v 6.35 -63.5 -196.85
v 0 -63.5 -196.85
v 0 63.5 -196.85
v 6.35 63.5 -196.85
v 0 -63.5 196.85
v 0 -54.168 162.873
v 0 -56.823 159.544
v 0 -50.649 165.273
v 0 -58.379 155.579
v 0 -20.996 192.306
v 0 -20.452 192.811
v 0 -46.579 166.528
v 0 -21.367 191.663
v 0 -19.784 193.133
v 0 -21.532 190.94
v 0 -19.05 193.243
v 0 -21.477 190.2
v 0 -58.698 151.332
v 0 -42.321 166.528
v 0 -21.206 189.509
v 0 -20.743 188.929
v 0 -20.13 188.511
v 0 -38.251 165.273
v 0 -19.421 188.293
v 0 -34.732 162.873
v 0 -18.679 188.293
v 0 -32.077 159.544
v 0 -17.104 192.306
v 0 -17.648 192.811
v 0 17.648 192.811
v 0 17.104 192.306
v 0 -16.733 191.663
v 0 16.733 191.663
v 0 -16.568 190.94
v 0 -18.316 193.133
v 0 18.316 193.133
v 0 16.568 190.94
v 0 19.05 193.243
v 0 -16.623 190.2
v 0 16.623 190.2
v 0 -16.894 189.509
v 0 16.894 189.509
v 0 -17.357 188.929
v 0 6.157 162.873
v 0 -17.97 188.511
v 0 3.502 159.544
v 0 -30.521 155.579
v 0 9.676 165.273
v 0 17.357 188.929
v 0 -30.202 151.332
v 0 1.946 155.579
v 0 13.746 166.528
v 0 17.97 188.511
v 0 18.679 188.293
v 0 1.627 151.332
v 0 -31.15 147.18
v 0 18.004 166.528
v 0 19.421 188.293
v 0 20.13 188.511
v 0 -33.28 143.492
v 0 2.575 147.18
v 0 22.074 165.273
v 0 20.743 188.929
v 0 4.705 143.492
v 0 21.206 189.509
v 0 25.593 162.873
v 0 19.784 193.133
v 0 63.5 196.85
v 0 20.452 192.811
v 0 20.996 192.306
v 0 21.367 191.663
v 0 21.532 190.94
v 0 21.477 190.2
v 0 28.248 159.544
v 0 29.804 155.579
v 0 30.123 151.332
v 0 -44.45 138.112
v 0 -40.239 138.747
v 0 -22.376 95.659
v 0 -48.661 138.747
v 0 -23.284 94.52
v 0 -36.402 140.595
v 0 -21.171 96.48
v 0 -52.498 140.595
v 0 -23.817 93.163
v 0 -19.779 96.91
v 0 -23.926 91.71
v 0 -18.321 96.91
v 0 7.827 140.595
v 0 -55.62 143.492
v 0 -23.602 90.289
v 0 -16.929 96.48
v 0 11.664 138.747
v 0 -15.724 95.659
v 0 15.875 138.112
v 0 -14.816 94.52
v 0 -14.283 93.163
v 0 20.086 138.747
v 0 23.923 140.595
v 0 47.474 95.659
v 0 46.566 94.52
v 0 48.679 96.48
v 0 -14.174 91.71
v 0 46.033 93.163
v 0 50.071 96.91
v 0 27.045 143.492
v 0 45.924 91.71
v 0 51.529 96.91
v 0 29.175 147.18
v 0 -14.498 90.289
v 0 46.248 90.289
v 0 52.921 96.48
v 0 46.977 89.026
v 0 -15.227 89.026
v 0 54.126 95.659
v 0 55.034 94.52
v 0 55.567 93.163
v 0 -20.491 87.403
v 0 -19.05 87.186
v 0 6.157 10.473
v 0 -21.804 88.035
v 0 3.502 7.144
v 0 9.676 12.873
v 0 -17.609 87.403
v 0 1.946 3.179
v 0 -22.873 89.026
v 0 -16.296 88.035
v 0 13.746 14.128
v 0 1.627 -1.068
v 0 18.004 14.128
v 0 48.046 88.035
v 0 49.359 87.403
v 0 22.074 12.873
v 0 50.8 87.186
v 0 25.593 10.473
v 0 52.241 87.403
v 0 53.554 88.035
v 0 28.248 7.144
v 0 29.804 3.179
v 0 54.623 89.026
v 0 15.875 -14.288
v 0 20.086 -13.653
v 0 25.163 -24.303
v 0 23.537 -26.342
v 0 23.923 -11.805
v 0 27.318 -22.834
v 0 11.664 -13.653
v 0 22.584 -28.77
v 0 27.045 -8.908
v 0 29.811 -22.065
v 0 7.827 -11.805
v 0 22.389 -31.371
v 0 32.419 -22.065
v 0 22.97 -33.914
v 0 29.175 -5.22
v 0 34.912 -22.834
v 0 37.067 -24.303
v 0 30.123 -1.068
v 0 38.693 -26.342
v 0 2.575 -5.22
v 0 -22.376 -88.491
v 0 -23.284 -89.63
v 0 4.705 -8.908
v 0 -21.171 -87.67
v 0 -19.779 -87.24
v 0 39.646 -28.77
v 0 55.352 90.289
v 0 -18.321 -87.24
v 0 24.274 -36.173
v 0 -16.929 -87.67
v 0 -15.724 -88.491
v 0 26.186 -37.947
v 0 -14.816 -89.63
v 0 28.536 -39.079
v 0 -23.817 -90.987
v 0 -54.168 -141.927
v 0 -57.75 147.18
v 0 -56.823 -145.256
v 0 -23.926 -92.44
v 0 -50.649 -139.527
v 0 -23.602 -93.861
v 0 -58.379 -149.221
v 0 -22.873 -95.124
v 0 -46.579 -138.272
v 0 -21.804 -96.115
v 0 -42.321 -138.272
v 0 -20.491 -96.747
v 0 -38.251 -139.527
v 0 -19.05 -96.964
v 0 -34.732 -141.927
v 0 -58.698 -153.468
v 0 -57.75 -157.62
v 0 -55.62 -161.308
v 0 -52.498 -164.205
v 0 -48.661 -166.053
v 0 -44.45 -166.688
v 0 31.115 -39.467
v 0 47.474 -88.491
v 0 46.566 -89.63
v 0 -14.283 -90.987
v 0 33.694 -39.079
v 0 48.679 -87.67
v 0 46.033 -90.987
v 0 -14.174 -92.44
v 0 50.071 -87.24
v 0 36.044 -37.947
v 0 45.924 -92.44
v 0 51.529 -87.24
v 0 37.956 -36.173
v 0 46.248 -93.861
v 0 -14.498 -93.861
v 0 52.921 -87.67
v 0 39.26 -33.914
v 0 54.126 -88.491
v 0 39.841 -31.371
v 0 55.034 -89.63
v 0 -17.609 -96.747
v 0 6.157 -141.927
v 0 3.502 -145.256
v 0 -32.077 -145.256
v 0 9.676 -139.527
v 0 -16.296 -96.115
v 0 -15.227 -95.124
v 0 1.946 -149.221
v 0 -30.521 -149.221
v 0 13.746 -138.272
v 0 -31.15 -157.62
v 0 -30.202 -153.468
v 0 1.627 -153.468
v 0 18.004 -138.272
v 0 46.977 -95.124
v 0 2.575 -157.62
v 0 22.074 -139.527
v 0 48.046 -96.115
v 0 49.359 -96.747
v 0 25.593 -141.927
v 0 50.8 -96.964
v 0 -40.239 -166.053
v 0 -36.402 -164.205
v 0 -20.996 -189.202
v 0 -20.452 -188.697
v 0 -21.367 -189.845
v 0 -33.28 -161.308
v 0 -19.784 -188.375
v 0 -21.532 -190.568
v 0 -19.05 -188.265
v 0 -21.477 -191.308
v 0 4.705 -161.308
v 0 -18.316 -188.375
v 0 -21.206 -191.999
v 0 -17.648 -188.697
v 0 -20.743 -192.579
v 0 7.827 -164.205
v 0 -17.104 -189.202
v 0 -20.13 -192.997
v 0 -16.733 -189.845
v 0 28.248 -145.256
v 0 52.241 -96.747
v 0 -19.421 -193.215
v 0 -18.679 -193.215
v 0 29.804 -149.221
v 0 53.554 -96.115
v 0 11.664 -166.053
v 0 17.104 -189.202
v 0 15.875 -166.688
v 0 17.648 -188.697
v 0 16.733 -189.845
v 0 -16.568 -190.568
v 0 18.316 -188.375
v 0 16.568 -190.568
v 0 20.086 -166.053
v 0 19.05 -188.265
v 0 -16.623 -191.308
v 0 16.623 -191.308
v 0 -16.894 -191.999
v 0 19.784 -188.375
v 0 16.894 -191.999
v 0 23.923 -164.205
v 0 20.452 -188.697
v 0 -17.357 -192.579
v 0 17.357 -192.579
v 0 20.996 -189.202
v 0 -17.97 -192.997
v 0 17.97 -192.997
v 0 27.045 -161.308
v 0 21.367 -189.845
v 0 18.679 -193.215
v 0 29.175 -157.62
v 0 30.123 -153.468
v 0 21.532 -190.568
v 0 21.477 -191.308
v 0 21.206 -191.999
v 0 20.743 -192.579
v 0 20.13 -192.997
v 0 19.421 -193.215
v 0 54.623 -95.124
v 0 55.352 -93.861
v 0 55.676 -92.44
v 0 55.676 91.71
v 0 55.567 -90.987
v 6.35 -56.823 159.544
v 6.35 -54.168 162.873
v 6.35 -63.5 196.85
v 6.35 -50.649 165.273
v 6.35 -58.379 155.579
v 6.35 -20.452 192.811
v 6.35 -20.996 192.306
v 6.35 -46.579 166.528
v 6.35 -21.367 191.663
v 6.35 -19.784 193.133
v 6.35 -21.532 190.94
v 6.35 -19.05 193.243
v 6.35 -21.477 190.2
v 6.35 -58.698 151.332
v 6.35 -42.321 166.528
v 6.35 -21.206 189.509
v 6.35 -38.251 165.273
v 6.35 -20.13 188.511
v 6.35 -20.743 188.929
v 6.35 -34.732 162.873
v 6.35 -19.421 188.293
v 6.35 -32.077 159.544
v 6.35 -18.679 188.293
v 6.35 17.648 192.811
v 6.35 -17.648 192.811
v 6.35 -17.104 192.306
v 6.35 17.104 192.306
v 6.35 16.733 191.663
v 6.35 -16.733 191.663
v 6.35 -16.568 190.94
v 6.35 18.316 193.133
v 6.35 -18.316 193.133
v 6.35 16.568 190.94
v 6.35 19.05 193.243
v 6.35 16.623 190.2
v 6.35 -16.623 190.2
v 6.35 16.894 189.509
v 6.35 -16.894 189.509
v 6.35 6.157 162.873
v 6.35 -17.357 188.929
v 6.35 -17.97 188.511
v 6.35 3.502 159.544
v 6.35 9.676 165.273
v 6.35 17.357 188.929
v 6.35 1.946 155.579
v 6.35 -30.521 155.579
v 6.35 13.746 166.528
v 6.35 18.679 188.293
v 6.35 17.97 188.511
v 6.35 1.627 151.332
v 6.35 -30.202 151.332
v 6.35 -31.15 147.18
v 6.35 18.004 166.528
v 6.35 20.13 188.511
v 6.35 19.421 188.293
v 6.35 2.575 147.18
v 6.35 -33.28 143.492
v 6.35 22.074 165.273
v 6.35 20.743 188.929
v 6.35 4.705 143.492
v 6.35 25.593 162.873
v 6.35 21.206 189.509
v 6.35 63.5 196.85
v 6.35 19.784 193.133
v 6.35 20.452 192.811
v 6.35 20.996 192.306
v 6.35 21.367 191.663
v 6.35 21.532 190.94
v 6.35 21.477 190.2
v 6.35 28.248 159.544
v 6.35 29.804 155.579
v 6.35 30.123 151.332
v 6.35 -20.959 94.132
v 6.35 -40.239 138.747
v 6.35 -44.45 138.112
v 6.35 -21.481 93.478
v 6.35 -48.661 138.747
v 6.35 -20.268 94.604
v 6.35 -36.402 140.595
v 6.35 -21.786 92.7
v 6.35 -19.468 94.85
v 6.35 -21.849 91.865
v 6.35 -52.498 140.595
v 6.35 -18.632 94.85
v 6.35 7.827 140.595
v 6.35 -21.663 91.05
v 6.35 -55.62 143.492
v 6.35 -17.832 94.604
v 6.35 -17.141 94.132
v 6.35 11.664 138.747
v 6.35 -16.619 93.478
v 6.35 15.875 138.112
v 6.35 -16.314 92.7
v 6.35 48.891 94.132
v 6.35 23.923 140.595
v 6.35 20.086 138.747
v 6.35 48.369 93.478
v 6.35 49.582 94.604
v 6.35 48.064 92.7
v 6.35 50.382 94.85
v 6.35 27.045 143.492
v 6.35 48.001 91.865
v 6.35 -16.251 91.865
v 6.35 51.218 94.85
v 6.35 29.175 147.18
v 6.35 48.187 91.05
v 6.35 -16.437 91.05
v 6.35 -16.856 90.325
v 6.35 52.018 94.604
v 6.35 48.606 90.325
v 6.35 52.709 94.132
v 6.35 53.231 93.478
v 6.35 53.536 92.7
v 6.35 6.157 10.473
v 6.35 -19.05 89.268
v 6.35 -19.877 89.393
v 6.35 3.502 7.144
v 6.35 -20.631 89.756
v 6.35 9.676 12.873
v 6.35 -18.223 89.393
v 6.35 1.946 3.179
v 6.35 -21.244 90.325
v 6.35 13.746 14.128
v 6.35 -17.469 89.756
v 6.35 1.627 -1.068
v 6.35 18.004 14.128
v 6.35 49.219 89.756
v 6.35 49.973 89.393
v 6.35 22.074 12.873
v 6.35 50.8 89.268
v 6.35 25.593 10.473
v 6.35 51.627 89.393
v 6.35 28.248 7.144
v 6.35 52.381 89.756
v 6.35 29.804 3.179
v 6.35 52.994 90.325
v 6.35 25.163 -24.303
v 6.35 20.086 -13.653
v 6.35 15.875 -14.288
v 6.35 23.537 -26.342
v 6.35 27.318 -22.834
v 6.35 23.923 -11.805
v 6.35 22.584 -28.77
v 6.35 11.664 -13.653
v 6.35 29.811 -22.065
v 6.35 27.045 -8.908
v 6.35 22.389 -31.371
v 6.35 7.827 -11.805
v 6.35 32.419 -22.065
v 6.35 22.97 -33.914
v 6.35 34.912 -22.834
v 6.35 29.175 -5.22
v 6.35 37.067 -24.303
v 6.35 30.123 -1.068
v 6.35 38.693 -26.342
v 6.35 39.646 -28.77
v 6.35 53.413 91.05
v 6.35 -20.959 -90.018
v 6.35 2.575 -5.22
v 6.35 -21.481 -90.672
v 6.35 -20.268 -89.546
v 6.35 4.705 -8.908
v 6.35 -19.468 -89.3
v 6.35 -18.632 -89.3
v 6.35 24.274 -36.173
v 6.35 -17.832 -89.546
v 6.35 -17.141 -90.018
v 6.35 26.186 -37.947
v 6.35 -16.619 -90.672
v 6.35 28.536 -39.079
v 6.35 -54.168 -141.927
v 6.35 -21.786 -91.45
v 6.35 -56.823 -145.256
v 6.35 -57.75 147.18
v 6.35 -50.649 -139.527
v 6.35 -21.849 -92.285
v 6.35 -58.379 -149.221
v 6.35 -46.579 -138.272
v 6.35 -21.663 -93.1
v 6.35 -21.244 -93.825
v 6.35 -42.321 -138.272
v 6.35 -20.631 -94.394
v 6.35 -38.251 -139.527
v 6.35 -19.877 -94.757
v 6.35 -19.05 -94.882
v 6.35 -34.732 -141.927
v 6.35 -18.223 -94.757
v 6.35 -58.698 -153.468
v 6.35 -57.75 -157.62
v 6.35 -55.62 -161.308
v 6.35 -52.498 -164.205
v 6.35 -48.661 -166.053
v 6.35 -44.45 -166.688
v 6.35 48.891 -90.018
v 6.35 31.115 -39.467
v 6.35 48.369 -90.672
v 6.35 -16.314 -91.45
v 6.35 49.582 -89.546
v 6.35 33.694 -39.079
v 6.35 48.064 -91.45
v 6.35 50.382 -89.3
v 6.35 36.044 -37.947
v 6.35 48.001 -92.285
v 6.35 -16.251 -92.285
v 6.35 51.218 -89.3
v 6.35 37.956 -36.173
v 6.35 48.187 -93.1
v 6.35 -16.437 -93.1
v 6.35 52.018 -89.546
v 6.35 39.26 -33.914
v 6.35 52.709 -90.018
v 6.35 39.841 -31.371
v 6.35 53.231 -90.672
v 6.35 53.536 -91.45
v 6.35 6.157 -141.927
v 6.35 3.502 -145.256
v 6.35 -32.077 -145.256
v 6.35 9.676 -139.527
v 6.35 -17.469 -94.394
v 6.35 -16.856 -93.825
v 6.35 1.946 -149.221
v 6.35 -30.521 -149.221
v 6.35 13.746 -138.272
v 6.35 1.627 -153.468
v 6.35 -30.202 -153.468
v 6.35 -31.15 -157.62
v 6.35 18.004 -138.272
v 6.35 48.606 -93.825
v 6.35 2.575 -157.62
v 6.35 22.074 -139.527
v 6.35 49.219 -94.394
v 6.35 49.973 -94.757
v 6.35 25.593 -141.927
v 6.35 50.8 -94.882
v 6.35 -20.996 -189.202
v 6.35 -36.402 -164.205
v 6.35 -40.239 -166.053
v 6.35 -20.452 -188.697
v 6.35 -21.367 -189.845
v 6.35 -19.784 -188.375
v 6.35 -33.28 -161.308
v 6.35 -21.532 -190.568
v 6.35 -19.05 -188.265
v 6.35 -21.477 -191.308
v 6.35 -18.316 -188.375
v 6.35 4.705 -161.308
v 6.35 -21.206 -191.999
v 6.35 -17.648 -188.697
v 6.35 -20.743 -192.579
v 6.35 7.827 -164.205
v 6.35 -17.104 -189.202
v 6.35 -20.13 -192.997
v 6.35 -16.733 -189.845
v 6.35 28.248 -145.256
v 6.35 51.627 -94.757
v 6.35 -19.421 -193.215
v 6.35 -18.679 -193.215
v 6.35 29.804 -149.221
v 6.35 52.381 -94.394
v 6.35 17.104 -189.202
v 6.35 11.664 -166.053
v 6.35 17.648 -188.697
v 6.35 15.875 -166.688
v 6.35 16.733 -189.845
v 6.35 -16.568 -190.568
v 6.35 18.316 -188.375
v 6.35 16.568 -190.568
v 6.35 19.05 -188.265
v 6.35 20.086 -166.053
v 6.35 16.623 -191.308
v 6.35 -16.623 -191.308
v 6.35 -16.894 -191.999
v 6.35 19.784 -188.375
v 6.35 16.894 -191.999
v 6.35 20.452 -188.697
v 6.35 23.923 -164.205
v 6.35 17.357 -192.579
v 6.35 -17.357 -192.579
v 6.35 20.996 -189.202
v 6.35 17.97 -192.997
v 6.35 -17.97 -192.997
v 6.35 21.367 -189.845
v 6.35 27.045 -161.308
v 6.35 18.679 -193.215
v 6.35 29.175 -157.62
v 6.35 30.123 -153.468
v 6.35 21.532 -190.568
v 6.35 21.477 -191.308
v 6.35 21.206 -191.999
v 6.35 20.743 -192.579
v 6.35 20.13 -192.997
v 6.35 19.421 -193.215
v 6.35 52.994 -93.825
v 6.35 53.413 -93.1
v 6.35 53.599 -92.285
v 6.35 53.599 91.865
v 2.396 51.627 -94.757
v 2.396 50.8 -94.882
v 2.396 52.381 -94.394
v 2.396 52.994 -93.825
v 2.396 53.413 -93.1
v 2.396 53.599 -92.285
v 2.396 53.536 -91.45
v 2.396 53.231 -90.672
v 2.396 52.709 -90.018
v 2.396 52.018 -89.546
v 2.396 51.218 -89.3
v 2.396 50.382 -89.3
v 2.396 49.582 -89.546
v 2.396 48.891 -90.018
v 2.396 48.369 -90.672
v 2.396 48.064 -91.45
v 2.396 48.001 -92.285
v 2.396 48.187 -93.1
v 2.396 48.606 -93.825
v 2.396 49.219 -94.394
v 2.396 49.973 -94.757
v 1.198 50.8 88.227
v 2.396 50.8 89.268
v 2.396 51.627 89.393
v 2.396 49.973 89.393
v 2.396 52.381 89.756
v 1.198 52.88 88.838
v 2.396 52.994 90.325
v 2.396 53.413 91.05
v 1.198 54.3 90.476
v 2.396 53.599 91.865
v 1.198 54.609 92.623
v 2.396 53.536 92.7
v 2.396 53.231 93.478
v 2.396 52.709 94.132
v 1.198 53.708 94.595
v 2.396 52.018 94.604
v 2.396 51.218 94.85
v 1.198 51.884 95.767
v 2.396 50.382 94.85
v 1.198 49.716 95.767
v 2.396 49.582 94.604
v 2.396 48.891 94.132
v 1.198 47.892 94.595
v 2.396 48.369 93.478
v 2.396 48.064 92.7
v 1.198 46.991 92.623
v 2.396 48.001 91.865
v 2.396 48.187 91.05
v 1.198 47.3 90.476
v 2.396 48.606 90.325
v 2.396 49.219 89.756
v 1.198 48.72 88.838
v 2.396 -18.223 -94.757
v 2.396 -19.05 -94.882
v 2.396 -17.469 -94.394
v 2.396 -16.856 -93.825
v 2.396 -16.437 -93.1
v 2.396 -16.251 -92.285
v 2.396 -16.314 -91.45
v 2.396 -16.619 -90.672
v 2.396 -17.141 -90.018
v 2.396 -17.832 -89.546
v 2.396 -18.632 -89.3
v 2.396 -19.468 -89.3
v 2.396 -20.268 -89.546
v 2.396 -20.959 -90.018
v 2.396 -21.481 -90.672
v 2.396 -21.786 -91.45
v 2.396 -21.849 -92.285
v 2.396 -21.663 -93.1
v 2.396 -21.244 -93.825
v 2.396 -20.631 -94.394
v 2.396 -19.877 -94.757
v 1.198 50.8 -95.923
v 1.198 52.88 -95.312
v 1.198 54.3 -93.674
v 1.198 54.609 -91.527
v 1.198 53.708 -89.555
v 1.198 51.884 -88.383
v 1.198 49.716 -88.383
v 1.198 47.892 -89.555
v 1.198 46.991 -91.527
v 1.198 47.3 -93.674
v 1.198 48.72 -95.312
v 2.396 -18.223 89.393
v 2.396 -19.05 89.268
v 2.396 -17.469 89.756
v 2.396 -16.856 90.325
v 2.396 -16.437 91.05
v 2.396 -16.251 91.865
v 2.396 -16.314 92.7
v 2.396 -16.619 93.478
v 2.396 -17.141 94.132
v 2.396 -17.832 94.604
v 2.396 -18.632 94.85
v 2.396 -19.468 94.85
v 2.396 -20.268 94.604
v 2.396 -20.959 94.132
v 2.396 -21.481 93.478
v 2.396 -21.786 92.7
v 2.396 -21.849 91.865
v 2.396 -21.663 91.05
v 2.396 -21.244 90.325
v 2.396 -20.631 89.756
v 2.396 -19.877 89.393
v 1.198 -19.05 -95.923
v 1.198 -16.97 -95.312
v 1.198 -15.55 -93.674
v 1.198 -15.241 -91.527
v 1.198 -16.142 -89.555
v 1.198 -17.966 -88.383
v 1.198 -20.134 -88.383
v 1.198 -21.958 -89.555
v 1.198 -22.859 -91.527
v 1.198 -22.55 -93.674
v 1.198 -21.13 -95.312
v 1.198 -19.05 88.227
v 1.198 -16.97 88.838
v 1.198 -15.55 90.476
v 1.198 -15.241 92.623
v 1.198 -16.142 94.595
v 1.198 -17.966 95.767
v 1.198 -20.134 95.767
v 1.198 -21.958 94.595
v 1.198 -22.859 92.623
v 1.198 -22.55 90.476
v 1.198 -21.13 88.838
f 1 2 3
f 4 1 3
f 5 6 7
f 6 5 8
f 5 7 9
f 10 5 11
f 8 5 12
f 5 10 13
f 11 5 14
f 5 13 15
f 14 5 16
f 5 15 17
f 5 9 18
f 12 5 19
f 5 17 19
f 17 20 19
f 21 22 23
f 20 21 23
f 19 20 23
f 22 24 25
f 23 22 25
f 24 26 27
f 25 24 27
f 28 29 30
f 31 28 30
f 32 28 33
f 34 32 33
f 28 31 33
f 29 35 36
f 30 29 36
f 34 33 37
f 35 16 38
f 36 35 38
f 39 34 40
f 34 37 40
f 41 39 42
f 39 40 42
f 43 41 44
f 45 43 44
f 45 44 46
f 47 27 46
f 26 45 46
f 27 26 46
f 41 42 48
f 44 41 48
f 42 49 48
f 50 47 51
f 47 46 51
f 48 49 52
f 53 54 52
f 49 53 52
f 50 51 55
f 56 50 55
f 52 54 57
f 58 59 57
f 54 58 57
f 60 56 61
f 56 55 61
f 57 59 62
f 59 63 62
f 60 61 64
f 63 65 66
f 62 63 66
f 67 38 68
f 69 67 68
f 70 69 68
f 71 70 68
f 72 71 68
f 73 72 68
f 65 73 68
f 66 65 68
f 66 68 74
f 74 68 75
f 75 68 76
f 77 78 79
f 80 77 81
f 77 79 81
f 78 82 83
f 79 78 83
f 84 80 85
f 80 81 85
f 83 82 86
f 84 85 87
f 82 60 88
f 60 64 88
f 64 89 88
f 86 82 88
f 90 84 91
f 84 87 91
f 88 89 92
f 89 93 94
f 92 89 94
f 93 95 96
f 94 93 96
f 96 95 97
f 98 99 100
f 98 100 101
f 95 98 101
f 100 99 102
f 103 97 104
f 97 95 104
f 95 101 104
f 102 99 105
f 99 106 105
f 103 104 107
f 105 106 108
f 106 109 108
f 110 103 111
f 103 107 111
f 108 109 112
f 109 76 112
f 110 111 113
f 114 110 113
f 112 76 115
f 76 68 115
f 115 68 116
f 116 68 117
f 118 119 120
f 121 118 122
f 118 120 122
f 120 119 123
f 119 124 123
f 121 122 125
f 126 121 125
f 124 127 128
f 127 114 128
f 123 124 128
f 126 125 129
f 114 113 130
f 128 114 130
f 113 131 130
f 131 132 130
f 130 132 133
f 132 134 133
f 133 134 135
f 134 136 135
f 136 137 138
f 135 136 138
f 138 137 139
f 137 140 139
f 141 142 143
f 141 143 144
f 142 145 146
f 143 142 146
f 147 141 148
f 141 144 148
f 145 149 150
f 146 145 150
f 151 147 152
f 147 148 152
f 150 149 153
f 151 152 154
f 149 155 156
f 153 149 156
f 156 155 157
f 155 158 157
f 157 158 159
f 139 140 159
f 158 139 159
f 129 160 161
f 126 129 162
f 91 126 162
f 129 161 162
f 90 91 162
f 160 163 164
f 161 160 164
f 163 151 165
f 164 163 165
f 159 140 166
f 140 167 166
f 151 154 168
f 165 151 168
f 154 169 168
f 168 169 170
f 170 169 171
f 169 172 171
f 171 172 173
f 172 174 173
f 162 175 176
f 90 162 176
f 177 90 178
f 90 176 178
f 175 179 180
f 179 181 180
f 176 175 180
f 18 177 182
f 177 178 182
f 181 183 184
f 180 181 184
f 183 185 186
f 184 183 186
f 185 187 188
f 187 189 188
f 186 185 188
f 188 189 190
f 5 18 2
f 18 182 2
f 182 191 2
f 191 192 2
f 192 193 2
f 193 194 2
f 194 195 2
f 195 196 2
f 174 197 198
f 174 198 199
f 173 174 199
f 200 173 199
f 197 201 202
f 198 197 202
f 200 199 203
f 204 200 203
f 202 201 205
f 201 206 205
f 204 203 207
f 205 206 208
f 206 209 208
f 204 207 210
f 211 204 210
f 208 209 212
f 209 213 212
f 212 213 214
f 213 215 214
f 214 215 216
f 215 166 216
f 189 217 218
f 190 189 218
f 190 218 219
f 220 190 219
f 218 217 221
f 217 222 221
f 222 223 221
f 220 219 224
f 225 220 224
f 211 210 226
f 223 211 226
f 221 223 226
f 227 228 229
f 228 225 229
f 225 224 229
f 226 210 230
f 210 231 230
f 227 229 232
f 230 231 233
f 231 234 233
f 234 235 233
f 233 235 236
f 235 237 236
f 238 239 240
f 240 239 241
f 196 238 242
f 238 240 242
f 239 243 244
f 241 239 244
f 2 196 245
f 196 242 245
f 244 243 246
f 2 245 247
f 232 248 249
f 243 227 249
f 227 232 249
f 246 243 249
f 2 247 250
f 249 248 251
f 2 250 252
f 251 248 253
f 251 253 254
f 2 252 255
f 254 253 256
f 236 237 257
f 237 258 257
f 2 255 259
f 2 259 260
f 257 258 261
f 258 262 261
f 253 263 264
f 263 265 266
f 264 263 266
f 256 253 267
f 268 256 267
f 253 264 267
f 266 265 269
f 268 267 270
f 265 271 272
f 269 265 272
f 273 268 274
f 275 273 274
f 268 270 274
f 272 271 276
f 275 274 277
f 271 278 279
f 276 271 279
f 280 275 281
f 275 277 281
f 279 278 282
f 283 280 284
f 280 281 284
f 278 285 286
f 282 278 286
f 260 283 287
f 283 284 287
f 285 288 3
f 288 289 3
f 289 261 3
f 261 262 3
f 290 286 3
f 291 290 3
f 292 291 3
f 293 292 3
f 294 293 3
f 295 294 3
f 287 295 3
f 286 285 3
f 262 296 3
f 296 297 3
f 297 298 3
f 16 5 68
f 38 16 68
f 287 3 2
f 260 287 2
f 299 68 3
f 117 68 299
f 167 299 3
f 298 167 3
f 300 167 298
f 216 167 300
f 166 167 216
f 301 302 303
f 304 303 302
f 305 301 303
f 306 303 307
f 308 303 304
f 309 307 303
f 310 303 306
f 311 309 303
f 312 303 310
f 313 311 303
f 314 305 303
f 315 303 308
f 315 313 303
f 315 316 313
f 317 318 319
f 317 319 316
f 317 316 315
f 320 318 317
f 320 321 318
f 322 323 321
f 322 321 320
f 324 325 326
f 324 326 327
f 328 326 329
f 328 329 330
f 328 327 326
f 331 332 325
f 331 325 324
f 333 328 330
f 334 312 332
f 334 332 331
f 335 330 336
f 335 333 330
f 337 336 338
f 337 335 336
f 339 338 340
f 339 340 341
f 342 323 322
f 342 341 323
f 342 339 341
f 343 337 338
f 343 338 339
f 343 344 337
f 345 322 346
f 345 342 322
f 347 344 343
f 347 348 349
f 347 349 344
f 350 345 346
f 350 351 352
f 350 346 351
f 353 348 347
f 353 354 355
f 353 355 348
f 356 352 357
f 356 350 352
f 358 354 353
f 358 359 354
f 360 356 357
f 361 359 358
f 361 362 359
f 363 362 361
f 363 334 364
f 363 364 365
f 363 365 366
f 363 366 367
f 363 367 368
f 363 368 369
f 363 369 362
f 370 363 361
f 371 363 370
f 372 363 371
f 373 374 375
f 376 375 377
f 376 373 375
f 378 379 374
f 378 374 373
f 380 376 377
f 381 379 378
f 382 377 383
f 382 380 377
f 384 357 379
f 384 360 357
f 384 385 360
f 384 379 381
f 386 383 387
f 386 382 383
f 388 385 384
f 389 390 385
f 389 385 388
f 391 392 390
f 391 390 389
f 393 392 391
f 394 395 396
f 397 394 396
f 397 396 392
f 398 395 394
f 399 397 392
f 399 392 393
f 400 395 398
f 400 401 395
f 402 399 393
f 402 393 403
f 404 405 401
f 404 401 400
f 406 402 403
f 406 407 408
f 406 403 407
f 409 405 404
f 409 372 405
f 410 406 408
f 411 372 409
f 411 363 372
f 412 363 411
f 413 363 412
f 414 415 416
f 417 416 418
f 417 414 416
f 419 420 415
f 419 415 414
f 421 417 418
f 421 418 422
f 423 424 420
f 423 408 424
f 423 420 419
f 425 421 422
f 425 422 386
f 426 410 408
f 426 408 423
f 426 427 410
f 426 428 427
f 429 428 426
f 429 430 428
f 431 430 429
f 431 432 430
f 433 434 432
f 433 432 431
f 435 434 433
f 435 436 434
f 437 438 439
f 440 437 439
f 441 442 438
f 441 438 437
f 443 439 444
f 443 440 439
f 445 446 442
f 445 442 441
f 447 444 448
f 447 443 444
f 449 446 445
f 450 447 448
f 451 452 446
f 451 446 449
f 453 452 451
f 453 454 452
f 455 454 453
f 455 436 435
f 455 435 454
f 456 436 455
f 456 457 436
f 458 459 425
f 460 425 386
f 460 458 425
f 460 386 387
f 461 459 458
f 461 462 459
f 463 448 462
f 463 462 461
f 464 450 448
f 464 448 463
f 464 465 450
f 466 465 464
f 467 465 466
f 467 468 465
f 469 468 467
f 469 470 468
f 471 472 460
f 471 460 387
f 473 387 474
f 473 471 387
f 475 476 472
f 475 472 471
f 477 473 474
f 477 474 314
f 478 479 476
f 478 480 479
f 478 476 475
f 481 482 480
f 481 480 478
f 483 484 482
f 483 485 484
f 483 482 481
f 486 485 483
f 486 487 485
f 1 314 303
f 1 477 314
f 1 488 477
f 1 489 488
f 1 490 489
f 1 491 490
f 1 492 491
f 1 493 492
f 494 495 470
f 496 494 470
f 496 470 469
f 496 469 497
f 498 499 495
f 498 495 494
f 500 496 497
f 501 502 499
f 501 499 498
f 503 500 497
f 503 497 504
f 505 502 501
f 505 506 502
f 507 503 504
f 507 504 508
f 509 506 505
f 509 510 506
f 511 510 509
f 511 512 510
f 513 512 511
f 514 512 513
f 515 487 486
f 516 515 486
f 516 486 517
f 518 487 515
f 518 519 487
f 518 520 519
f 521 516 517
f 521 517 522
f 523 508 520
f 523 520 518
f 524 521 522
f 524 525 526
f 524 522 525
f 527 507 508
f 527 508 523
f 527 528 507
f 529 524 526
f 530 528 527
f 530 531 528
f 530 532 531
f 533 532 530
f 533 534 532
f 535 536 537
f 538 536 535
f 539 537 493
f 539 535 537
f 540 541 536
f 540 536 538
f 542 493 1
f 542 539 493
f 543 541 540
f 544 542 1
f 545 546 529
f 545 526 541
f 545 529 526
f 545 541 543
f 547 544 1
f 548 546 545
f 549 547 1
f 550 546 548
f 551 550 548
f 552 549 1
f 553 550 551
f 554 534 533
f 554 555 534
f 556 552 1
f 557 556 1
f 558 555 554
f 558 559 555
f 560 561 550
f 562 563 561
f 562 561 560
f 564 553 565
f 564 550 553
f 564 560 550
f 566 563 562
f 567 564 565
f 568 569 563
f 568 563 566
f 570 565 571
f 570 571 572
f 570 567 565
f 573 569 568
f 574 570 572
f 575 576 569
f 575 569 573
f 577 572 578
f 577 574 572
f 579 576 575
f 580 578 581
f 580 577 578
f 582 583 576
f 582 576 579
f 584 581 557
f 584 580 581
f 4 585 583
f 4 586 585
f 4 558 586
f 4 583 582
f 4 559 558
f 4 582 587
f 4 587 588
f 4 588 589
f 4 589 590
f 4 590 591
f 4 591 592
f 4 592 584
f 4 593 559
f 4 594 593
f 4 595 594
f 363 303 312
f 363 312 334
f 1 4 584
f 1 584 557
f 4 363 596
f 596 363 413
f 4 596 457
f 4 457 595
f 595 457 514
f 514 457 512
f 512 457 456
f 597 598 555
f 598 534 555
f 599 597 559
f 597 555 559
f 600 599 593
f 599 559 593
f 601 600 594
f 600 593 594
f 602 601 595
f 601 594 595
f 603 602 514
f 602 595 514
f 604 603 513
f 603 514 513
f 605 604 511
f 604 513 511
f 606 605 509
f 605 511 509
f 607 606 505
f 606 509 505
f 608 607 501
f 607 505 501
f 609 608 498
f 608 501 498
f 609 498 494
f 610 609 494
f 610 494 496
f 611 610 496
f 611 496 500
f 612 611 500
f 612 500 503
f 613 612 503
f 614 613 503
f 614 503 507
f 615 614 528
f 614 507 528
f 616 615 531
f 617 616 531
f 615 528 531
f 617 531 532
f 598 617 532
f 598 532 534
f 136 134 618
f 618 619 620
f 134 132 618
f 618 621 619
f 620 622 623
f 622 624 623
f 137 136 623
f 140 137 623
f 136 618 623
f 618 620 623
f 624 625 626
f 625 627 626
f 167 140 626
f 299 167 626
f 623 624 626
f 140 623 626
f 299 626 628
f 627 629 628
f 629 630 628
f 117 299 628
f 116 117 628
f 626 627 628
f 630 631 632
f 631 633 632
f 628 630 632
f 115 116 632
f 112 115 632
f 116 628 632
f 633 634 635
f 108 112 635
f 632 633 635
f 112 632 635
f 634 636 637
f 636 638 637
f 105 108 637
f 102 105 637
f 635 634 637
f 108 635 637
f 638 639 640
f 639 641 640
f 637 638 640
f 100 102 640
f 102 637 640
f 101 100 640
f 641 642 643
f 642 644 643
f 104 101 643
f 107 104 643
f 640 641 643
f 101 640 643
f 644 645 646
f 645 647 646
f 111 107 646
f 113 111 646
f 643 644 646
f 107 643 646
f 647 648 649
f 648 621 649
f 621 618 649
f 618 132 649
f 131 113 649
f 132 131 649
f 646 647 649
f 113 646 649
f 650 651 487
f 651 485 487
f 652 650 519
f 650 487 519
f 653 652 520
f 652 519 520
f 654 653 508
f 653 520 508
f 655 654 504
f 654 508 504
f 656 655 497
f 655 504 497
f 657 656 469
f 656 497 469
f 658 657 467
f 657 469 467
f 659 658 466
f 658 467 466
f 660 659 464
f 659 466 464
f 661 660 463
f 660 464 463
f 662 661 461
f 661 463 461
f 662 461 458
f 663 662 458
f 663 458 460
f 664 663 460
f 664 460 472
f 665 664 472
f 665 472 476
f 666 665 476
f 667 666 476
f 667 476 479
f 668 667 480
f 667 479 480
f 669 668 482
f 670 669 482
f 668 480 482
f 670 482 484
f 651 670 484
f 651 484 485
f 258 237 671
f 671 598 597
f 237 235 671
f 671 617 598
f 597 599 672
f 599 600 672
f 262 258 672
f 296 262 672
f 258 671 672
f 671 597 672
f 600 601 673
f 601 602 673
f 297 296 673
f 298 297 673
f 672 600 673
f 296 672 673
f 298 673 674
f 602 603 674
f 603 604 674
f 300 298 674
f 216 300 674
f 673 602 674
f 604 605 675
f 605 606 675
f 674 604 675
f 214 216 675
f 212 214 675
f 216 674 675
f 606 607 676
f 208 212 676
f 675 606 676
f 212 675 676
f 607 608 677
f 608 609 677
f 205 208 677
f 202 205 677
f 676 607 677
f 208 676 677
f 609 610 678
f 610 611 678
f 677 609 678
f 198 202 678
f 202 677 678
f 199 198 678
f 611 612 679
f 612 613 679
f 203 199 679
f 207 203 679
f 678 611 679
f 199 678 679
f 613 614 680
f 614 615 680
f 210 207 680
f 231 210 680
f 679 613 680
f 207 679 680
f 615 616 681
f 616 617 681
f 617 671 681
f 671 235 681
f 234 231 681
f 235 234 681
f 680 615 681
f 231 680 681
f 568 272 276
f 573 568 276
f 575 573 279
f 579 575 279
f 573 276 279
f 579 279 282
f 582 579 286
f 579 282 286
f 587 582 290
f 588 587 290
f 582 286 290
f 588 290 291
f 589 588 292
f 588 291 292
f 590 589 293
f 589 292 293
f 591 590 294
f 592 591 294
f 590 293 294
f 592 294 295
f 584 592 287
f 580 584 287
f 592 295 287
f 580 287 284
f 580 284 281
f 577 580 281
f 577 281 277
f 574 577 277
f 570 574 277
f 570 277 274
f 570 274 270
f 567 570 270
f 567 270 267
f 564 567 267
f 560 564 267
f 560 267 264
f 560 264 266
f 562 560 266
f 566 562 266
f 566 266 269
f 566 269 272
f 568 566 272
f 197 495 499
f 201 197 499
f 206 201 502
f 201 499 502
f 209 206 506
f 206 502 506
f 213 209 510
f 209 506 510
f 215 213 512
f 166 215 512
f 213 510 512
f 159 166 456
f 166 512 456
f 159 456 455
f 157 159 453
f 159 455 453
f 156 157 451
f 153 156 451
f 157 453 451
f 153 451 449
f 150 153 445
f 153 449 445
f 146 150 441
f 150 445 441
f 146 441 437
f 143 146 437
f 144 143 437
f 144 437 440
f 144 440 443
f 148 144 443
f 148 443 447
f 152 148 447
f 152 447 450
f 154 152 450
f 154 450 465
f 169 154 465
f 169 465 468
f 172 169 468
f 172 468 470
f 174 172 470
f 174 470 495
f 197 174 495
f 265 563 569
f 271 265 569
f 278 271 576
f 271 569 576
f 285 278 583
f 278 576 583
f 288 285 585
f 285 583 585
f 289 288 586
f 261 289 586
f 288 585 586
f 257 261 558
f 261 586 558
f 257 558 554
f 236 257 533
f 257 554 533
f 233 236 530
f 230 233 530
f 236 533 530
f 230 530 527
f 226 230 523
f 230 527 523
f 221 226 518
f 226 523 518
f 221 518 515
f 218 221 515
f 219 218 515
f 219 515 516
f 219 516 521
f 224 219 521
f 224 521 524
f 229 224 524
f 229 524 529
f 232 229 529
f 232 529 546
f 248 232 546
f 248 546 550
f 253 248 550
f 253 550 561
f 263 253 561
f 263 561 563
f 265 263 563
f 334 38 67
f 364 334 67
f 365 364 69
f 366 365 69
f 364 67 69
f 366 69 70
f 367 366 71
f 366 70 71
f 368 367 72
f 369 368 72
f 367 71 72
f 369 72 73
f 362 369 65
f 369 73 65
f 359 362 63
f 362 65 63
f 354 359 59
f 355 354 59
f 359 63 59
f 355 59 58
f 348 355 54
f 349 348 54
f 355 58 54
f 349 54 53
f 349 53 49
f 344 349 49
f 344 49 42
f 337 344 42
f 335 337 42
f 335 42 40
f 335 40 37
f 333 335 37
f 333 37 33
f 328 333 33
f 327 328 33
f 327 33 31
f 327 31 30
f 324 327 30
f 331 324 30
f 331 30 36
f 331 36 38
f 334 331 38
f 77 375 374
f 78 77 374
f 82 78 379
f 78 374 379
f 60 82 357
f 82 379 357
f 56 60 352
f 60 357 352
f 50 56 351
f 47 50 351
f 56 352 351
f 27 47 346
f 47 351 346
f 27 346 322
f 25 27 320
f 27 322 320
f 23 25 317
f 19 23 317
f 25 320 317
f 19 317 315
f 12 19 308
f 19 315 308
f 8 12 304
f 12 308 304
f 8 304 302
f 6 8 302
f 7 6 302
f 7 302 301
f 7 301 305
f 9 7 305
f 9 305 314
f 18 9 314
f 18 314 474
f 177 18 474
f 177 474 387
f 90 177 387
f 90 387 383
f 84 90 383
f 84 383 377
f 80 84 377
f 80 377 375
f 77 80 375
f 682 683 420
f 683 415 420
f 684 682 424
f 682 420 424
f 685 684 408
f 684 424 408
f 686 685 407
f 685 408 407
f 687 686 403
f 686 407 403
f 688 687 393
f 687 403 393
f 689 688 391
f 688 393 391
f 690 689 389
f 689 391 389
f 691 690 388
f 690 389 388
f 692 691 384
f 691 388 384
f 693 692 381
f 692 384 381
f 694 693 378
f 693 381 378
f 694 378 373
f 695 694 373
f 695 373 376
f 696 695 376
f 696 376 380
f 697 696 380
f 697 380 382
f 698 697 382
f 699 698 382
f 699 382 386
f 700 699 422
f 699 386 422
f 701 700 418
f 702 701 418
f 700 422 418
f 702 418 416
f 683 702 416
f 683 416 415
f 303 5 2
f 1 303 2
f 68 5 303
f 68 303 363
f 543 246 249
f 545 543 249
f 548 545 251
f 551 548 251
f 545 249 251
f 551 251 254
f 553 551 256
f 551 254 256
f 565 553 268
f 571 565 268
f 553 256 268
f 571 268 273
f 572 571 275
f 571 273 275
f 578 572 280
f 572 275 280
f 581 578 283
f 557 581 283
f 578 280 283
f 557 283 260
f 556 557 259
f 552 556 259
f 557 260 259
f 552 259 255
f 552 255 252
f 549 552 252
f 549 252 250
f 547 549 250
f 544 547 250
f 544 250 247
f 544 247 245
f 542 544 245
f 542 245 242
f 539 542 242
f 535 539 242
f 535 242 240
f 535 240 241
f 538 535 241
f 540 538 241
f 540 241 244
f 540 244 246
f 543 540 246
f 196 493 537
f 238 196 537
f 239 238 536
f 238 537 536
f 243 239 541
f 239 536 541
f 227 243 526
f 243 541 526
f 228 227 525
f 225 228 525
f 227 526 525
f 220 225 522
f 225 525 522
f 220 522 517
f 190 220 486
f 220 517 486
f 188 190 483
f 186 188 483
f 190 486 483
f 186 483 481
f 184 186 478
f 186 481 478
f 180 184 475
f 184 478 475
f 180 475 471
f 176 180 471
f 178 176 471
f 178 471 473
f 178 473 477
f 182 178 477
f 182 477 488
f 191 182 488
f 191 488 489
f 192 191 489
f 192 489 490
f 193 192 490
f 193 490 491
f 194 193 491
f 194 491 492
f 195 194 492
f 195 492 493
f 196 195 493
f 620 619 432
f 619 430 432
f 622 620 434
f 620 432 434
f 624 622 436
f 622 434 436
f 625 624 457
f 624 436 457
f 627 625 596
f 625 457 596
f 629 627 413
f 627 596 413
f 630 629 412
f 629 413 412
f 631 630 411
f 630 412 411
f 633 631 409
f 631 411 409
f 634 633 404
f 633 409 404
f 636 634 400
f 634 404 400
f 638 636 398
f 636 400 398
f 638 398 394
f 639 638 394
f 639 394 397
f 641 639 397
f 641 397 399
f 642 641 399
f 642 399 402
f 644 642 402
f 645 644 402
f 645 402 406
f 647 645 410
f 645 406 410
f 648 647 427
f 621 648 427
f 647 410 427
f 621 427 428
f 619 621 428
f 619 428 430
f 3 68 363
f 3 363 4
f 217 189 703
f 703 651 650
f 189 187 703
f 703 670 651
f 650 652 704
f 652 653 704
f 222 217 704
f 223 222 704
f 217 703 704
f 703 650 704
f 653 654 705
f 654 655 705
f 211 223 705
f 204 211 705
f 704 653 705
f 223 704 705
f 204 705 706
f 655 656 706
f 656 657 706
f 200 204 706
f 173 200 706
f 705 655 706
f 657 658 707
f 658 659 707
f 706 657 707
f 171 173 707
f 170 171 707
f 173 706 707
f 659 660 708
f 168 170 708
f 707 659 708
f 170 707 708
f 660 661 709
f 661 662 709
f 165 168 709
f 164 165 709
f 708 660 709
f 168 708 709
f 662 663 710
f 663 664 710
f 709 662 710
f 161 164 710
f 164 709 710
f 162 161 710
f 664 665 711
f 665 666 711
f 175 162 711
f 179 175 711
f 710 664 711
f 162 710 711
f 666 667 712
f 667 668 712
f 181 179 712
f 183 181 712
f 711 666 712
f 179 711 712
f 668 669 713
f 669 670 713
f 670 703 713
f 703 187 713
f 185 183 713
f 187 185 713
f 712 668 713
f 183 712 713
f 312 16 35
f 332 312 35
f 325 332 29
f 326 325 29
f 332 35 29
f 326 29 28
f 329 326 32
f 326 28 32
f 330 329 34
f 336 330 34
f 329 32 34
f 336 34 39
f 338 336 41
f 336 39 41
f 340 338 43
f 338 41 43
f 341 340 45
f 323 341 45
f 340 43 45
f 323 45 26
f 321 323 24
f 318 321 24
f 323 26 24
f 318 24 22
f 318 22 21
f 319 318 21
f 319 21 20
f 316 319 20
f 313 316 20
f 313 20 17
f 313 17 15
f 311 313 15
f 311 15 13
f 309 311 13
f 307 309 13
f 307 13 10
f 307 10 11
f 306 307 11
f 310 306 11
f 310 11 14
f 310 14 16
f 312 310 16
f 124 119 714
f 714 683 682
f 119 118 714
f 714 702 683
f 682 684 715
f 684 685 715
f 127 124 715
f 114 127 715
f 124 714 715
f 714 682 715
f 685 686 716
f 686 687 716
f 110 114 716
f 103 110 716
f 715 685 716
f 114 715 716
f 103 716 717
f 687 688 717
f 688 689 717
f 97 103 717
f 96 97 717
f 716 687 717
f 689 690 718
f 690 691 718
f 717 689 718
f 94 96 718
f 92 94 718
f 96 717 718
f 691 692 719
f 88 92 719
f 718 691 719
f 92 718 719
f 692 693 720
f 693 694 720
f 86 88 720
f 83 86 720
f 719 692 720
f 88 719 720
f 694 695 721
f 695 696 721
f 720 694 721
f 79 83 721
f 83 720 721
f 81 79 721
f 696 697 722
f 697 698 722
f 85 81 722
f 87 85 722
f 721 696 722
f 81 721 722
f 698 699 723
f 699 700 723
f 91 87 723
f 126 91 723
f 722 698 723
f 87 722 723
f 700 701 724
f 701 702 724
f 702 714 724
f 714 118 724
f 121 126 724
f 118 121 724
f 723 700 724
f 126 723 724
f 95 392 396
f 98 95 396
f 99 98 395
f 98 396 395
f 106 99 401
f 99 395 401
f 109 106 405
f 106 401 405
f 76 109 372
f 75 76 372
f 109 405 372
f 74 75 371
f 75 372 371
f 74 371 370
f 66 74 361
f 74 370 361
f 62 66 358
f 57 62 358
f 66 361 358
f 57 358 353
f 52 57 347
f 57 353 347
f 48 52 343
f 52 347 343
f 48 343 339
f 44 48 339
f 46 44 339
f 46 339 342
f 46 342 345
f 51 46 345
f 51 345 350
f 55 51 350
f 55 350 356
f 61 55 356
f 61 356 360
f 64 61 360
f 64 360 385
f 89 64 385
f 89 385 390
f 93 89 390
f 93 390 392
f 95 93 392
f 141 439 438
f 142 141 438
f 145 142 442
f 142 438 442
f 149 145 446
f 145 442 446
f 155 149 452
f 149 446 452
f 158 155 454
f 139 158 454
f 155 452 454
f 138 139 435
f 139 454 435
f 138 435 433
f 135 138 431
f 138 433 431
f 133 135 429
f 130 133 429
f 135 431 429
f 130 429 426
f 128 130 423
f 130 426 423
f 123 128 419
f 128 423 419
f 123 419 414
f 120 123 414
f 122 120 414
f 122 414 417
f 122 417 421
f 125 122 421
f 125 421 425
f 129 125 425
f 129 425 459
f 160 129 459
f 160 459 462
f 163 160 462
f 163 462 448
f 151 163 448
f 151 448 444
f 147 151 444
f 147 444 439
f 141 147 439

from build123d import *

# Parameters (mm, degrees)
SKETCH1_W                                       = 393.7
SKETCH1_H                                       = 127
BOSS_EXTRUDE1_DEPTH                             = 6.35
SKETCH2_R                                       = 14.2875
SKETCH2_R_2                                     = 8.750046
CUT_EXTRUDE1_DEPTH                              = 207.935968357
F_10_CLEARANCE_HOLE1_D                          = 4.9784
CSK_FOR_10_FLAT_HEAD_MACHINE_SCREW2_D           = 5.6134
CSK_FOR_10_FLAT_HEAD_MACHINE_SCREW2_CSINK_D     = 9.779
CSK_FOR_10_FLAT_HEAD_MACHINE_SCREW2_CSINK_ANGLE = 82


with BuildPart() as part:
    # Sketch1 → Boss-Extrude1 (new body)
    with BuildSketch(Plane(origin=(0, 0, 0), x_dir=(0, 0, -1), z_dir=(1, 0, 0))):
        Rectangle(SKETCH1_W, SKETCH1_H)
    extrude(amount=BOSS_EXTRUDE1_DEPTH)

    # Sketch2 → Cut-Extrude1 (cut, through all)
    with BuildSketch(Plane(origin=(6.35, 0, 0), x_dir=(0, 0, -1), z_dir=(1, 0, 0))):
        with Locations((0, 15.875)):
            Circle(SKETCH2_R)
        with Locations((-152.4, 15.875)):
            Circle(SKETCH2_R)
        with Locations((152.4, 15.875)):
            Circle(SKETCH2_R)
        with Locations((-152.4, -44.45)):
            Circle(SKETCH2_R)
        with Locations((152.4, -44.45)):
            Circle(SKETCH2_R)
        with Locations((30.717202021, 31.115)):
            Circle(SKETCH2_R_2)
    extrude(amount=-CUT_EXTRUDE1_DEPTH, mode=Mode.SUBTRACT)

    # #10 Clearance Hole1 (through all)
    with Locations(Plane(origin=(6.35, 0, 0), x_dir=(0, 0, -1), z_dir=(1, 0, 0))):
        with Locations((-190.754, 19.05), (-190.754, -19.05), (190.754, 19.05), (190.754, -19.05)):
            Hole(F_10_CLEARANCE_HOLE1_D / 2)

    # CSK for #10 Flat Head Machine Screw2 (through all)
    with Locations(Plane.ZY):
        with Locations((-92.075, 50.8), (-92.075, -19.05), (92.075, -19.05), (92.075, 50.8)):
            CounterSinkHole(CSK_FOR_10_FLAT_HEAD_MACHINE_SCREW2_D / 2, CSK_FOR_10_FLAT_HEAD_MACHINE_SCREW2_CSINK_D / 2, counter_sink_angle=CSK_FOR_10_FLAT_HEAD_MACHINE_SCREW2_CSINK_ANGLE)


solid = part.part
